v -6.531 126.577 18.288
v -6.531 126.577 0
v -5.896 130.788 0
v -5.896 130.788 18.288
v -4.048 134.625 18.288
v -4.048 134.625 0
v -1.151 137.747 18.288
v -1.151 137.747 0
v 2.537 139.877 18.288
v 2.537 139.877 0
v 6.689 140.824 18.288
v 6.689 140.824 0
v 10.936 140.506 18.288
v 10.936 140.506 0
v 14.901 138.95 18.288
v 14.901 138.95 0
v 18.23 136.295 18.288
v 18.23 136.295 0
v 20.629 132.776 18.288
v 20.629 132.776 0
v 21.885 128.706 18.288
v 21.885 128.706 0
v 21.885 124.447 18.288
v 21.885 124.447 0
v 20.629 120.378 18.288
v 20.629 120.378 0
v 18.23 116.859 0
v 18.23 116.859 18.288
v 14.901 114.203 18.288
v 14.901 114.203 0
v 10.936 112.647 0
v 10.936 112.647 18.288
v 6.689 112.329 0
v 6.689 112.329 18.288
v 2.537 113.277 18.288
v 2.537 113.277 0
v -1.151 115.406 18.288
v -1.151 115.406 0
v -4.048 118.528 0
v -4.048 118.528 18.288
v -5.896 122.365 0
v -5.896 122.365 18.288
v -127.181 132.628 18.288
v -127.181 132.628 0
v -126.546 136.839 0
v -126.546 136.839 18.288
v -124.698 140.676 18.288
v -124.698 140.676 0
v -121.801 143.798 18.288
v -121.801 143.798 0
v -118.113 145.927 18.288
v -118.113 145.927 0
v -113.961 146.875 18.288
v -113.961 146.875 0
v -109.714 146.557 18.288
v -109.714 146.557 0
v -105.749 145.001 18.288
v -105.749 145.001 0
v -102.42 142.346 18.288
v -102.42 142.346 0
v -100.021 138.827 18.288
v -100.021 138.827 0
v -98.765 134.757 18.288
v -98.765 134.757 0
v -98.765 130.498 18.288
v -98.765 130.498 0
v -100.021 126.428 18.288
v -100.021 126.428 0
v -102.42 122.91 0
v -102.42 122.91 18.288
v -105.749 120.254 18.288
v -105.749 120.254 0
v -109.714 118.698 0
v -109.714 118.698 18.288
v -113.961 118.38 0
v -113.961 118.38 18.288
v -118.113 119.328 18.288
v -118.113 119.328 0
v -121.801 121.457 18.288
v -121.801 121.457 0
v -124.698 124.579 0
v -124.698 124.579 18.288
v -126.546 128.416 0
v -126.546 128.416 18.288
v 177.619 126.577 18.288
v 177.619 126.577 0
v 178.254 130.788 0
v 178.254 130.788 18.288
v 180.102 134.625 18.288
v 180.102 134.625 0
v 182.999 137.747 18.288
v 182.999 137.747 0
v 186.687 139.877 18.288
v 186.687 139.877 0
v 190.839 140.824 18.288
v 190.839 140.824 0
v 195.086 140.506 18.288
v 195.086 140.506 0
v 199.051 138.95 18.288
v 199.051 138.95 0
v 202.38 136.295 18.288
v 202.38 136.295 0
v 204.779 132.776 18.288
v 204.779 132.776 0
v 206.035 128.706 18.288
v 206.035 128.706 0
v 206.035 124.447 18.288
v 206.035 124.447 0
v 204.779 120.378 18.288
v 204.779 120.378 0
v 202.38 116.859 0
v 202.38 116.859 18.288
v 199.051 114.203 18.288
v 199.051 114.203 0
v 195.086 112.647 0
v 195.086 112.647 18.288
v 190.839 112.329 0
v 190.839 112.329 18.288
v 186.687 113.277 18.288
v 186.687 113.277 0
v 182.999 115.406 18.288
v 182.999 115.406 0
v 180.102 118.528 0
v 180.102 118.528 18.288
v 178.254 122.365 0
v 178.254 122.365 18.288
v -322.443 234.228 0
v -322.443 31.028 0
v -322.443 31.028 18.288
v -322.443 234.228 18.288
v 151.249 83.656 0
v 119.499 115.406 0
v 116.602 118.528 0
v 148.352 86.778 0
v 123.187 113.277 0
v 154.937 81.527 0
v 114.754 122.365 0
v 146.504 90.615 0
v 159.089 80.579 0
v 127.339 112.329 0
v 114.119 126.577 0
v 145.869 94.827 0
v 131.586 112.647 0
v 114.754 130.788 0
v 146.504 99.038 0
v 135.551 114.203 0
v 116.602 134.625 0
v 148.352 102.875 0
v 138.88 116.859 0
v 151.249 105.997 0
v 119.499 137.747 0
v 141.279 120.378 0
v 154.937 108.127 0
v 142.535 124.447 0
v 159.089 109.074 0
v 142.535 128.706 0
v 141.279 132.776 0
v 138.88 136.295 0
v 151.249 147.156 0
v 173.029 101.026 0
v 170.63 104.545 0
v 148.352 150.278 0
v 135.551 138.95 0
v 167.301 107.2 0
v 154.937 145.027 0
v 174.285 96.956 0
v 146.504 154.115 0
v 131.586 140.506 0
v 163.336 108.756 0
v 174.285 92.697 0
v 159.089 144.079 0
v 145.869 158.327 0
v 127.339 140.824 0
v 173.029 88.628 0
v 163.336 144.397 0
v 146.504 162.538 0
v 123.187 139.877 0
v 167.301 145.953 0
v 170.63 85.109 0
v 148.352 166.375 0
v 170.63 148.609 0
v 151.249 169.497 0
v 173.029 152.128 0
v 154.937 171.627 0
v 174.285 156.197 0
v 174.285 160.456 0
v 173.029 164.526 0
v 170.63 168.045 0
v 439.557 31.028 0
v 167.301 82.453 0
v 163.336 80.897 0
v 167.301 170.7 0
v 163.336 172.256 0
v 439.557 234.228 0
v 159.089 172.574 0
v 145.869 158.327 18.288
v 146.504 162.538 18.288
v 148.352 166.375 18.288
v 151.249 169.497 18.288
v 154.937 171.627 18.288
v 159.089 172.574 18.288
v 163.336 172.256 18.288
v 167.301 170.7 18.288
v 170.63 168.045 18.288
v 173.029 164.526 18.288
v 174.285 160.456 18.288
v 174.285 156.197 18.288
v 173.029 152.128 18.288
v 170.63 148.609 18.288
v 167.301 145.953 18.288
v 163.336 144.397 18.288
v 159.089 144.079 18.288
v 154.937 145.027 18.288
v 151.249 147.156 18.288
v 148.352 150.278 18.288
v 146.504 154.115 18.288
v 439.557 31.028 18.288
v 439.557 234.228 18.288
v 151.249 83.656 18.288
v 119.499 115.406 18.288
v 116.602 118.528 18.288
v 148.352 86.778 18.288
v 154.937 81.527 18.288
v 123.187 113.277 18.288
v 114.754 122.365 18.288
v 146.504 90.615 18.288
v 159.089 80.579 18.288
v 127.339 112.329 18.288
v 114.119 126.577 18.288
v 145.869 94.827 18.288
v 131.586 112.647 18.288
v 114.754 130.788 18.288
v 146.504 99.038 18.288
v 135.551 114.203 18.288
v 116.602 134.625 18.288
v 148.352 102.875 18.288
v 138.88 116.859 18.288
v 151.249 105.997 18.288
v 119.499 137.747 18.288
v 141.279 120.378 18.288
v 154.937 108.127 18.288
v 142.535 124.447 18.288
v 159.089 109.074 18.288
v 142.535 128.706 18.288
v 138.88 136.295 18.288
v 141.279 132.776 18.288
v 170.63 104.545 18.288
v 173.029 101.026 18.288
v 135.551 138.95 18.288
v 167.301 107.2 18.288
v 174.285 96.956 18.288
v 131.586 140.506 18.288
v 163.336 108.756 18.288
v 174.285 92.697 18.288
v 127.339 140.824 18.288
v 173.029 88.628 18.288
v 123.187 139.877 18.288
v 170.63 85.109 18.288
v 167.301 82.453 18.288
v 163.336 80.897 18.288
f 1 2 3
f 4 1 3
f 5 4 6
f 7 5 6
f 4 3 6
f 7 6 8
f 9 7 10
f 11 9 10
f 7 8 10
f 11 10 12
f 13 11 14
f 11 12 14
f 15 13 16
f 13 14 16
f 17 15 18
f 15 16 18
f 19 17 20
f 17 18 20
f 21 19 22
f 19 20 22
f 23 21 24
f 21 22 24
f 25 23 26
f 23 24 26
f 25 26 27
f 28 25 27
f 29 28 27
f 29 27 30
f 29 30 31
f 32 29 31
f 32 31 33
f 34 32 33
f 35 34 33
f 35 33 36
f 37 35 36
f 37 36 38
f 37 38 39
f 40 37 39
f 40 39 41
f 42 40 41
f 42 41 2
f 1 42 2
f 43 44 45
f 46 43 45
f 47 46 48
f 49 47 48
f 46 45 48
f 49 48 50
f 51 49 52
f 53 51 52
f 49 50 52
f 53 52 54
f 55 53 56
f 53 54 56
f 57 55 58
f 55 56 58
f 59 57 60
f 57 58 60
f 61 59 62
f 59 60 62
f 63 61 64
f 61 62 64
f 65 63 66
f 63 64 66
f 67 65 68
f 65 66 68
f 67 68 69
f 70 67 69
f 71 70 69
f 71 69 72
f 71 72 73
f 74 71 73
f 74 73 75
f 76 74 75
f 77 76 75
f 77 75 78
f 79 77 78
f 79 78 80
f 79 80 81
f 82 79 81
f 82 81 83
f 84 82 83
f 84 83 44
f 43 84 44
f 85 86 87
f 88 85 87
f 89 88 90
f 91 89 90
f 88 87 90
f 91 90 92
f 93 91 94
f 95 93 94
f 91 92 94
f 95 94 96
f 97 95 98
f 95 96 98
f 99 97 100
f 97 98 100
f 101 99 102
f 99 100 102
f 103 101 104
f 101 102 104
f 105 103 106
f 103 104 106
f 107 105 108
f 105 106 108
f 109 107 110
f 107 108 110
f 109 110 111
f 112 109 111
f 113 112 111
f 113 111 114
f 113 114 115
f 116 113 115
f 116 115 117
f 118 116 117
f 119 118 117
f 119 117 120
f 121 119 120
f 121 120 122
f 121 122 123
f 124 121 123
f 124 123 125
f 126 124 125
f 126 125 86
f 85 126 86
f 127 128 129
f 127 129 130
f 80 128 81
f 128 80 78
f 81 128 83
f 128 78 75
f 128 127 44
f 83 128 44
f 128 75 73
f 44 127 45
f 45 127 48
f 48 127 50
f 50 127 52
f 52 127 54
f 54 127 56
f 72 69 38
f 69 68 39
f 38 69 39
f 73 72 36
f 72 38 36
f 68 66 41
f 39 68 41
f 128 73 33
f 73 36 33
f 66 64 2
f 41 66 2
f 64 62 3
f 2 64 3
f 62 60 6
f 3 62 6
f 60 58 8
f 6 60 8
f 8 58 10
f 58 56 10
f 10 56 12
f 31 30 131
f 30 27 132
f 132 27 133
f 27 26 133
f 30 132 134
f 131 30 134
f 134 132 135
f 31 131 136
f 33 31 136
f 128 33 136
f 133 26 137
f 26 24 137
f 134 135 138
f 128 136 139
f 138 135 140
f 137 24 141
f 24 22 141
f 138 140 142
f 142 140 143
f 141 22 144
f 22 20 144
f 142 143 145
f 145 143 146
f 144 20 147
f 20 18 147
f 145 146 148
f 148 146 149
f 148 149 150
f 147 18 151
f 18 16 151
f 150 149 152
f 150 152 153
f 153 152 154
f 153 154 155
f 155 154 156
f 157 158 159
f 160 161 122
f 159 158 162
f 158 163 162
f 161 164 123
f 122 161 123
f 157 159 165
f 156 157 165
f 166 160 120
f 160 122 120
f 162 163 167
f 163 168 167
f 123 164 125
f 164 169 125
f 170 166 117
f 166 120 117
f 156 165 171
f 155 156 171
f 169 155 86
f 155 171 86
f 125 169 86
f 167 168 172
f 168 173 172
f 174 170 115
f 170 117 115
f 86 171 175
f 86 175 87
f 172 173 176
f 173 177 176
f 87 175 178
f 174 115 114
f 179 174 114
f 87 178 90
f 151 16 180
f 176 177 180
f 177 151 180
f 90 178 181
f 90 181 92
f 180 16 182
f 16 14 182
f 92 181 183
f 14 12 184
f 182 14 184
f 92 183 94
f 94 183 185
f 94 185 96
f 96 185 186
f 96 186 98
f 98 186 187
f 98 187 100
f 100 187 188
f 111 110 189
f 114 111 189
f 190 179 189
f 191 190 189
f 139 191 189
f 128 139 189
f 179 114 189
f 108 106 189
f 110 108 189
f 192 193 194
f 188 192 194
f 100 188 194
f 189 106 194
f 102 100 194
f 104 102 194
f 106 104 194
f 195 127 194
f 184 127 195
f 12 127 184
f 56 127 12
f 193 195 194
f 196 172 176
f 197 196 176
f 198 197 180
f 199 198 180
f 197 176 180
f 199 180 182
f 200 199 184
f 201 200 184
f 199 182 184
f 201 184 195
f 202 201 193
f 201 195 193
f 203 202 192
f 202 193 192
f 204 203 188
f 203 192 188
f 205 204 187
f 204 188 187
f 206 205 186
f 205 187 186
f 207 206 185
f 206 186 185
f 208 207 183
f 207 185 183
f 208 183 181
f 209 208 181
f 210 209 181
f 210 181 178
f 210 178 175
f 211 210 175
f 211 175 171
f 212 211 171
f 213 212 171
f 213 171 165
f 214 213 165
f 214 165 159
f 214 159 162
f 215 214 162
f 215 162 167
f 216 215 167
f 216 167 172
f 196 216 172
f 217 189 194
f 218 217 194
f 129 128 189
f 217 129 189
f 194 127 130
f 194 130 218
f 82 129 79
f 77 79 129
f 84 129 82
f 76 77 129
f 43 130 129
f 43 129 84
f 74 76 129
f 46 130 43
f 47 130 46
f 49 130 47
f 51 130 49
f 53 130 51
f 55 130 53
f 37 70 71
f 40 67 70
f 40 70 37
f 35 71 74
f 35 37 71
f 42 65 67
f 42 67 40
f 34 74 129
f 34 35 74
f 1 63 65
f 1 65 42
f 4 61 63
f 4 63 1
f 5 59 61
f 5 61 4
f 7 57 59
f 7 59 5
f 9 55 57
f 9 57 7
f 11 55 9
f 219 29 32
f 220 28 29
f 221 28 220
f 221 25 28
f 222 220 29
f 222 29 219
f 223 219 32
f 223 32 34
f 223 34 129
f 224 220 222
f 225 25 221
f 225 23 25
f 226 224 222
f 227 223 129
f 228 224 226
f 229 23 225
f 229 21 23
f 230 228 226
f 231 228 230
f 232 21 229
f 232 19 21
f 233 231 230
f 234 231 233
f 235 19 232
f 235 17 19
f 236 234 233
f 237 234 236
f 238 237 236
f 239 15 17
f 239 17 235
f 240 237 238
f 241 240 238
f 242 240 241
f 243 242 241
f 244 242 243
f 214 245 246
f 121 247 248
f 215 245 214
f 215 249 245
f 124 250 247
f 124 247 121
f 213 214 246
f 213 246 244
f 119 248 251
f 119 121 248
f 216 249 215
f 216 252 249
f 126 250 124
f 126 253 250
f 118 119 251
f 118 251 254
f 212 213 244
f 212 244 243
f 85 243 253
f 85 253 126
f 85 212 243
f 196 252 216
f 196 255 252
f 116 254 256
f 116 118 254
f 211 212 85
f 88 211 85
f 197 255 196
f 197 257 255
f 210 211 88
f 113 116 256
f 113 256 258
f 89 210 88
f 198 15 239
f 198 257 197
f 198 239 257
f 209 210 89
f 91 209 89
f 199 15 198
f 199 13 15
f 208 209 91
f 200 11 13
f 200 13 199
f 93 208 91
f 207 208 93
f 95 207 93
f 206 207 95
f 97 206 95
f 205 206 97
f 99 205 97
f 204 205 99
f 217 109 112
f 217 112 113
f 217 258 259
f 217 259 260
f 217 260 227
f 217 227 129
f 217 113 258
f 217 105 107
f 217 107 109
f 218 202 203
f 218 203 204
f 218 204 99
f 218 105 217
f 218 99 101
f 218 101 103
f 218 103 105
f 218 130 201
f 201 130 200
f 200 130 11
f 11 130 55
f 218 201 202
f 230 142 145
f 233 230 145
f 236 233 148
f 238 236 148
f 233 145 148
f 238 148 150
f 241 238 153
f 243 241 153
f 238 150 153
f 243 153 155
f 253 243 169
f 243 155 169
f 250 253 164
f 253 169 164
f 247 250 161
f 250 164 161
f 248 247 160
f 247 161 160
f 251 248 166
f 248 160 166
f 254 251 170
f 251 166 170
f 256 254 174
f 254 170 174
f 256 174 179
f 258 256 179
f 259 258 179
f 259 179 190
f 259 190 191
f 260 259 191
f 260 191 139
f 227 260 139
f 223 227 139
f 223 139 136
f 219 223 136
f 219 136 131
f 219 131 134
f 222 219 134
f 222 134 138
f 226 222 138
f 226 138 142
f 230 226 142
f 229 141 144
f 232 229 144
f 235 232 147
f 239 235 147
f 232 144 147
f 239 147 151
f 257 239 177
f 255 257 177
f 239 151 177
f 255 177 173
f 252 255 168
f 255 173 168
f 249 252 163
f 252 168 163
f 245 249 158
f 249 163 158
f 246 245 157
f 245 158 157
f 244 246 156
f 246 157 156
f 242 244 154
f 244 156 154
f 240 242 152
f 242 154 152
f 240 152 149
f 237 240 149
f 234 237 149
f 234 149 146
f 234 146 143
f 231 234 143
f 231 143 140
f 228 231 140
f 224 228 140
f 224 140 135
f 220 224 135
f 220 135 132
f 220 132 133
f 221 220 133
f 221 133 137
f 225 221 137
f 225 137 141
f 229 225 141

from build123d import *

# Parameters (mm, degrees)
SKETCH1_W           = 762
SKETCH1_H           = 203.2
BOSS_EXTRUDE1_DEPTH = 18.288
SKETCH2_R           = 14.2875
CUT_EXTRUDE1_DEPTH  = 499.404705003
SKETCH3_R           = 14.2875
CUT_EXTRUDE2_DEPTH  = 499.404705003


with BuildPart() as part:
    # Sketch1 → Boss-Extrude1 (new body)
    with BuildSketch(Plane.XY):
        with Locations((58.556886228, 132.62754491)):
            Rectangle(SKETCH1_W, SKETCH1_H)
    extrude(amount=BOSS_EXTRUDE1_DEPTH)

    # Sketch2 → Cut-Extrude1 (cut, through all)
    with BuildSketch(Plane(origin=(0, 0, 0), x_dir=(-1, 0, 0), z_dir=(0, 0, -1))):
        with Locations((112.893113772, 132.62754491)):
            Circle(SKETCH2_R)
    extrude(amount=-CUT_EXTRUDE1_DEPTH, mode=Mode.SUBTRACT)

    # Sketch3 → Cut-Extrude2 (cut, through all)
    with BuildSketch(Plane(origin=(0, 0, 0), x_dir=(-1, 0, 0), z_dir=(0, 0, -1))):
        with Locations((-128.406886228, 126.576648332)):
            Circle(SKETCH3_R)
        with Locations((-191.906886228, 126.576648332)):
            Circle(SKETCH3_R)
        with Locations((-160.156886228, 158.326648332)):
            Circle(SKETCH3_R)
        with Locations((-160.156886228, 94.826648332)):
            Circle(SKETCH3_R)
        with Locations((-7.756886228, 126.576648332)):
            Circle(SKETCH3_R)
    extrude(amount=-CUT_EXTRUDE2_DEPTH, mode=Mode.SUBTRACT)


solid = part.part
